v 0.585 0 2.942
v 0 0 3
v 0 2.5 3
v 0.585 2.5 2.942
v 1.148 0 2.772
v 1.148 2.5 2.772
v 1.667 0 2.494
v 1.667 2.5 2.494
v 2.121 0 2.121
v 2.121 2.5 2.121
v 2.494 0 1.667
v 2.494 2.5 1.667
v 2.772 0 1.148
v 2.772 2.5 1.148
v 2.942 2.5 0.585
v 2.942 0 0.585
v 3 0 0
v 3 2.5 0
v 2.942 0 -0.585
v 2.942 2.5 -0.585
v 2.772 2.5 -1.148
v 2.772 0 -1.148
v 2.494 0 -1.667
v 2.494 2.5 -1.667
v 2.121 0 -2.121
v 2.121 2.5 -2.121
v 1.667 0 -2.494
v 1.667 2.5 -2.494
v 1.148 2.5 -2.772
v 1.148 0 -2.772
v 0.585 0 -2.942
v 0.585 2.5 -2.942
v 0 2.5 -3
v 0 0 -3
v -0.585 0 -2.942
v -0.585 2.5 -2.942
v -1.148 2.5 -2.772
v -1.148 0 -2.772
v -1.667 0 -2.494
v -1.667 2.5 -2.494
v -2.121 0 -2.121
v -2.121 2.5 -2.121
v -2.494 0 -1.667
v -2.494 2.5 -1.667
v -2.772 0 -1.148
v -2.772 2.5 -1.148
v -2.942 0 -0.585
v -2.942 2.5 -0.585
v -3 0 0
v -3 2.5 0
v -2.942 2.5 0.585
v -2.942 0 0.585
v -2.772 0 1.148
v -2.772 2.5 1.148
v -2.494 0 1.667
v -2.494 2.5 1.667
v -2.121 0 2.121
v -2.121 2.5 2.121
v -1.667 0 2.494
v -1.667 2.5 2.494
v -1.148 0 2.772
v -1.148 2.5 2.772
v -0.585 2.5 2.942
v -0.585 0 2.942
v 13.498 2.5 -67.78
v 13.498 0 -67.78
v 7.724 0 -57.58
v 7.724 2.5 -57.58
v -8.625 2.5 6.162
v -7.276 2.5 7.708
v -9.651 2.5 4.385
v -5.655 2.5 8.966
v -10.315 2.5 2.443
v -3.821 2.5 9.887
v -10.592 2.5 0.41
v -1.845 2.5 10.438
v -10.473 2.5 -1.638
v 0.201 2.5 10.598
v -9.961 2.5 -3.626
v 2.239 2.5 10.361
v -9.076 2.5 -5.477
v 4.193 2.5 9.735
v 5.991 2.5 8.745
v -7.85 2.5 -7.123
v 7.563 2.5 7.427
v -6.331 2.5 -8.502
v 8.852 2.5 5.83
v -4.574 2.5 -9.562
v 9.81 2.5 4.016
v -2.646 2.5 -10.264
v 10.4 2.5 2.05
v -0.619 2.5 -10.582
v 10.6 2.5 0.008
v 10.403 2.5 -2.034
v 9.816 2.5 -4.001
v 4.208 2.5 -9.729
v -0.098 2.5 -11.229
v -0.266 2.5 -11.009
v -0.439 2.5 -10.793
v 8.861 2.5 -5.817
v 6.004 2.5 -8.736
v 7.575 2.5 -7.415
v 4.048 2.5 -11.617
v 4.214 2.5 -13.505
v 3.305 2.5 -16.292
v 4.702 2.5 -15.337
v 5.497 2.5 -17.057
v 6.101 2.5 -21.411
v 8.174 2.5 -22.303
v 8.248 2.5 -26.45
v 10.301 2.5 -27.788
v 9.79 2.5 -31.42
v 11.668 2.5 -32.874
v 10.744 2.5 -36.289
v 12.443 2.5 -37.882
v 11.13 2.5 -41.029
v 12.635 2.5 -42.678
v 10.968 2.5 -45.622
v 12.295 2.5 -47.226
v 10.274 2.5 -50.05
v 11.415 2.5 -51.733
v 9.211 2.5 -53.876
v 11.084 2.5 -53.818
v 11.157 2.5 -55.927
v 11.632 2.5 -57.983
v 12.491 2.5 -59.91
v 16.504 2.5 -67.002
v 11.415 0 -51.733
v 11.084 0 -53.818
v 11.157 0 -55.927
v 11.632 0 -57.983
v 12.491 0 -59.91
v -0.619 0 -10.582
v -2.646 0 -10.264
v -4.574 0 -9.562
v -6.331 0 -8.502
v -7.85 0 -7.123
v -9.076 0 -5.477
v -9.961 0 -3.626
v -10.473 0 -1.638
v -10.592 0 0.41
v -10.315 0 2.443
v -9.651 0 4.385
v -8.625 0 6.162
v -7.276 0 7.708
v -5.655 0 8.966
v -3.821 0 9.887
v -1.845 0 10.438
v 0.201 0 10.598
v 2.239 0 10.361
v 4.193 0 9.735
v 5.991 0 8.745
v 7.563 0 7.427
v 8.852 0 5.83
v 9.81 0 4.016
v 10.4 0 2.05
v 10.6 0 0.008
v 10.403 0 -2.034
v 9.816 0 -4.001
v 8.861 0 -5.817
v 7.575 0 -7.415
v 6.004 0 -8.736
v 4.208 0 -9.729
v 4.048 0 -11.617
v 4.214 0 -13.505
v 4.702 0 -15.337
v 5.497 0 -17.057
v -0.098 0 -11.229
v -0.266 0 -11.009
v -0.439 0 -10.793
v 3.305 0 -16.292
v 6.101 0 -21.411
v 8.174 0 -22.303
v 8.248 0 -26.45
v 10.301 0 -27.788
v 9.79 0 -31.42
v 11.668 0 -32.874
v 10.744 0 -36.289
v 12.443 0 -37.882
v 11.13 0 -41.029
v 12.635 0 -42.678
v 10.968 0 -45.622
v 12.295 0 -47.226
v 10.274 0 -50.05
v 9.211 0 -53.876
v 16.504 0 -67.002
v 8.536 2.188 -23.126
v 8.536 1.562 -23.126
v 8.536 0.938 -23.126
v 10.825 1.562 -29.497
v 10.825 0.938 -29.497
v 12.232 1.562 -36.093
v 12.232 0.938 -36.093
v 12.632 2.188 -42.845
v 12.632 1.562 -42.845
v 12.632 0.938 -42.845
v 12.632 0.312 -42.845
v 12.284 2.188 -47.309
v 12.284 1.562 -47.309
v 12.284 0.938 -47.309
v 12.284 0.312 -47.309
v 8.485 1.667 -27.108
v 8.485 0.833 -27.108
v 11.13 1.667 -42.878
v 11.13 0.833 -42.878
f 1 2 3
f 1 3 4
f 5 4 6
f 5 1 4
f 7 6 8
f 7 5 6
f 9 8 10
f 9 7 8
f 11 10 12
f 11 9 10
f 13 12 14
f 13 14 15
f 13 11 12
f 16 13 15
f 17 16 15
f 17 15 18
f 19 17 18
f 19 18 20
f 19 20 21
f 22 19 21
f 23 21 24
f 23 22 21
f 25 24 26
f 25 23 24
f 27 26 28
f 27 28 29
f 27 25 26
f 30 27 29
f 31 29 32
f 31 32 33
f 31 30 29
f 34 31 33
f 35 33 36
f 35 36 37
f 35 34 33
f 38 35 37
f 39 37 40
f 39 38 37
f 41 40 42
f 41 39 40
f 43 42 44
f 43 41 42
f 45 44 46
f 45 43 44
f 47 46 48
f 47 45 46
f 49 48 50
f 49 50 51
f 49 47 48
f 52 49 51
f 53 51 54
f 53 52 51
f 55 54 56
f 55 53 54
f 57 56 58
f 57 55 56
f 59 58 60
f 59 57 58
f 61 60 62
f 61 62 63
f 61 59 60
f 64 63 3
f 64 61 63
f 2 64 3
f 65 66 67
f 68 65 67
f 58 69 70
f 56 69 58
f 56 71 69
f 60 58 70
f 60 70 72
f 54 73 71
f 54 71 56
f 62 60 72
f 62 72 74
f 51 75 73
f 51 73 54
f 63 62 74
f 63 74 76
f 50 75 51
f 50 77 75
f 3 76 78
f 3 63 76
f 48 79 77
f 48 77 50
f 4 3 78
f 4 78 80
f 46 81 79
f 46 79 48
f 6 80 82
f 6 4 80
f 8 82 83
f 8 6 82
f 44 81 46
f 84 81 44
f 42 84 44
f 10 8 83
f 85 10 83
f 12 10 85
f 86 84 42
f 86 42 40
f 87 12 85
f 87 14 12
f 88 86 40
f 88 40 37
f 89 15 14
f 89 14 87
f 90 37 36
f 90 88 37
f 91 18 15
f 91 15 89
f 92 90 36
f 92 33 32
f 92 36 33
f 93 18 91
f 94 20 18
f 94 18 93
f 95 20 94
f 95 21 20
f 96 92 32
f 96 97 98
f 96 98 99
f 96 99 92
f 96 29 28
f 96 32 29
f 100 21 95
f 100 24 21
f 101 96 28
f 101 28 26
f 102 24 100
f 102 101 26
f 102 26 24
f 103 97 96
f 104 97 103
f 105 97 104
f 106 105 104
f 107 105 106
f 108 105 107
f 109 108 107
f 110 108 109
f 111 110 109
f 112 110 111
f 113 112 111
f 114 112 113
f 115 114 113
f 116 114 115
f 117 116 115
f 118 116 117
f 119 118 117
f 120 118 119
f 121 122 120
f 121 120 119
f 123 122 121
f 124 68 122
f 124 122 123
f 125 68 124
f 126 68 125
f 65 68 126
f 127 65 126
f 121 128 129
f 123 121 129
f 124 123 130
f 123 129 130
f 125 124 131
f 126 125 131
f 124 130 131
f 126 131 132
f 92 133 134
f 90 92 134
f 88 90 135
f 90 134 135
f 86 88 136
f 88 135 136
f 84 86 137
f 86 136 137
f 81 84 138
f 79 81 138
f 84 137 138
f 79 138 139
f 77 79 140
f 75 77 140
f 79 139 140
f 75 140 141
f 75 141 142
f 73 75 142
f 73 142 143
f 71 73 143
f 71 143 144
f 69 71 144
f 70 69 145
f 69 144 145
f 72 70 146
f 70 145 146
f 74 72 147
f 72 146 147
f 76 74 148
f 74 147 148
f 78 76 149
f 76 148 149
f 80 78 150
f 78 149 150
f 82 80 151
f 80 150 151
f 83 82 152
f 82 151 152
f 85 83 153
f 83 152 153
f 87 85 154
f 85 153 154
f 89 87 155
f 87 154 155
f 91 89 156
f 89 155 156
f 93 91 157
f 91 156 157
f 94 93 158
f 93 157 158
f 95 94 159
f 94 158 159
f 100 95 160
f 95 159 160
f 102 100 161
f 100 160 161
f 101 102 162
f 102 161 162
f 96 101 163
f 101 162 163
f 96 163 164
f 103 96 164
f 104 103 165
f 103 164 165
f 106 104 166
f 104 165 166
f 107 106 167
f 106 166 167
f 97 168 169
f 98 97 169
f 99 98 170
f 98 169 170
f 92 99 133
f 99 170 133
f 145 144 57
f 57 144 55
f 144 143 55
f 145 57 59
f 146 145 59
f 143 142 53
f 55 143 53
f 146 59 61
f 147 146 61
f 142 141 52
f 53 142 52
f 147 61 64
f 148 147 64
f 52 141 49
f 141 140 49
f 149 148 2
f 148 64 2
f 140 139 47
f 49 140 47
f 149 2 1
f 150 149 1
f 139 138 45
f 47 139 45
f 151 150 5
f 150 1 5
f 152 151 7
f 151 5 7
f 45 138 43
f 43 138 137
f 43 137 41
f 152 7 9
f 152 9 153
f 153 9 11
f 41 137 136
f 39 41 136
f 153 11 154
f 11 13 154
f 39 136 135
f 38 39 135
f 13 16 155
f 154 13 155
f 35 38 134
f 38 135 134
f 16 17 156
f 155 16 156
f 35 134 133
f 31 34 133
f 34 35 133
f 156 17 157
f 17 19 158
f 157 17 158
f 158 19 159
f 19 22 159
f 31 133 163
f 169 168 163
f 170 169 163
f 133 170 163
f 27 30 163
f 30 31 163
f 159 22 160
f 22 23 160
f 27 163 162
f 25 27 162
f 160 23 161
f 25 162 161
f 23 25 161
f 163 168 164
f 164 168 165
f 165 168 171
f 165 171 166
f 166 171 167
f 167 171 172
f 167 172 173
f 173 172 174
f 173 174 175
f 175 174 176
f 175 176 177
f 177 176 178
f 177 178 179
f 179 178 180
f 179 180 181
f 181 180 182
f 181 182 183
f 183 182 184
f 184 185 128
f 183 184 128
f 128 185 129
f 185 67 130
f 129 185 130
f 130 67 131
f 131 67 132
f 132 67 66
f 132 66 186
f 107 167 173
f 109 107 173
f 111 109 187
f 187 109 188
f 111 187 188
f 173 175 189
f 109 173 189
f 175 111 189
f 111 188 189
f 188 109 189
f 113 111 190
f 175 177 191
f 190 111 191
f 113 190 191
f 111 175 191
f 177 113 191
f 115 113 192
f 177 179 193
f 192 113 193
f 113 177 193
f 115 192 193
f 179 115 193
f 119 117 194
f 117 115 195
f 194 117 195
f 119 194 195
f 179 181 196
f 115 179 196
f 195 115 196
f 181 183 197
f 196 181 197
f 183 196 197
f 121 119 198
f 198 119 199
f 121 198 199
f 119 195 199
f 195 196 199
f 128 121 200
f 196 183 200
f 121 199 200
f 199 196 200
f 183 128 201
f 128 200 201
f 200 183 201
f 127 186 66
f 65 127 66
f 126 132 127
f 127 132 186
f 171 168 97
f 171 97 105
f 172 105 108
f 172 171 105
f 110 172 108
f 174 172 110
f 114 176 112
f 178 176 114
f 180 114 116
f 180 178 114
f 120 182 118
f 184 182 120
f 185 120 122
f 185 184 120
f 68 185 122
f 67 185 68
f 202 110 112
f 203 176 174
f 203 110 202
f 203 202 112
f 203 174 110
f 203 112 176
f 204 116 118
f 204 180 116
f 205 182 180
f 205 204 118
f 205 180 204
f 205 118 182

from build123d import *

# Parameters (mm, degrees)
SKETCH1_R           = 3
BOSS_EXTRUDE1_DEPTH = 2.5


with BuildPart() as part:
    # Sketch1 → Boss-Extrude1 (new body)
    with BuildSketch(Plane(origin=(0, 0, 0), x_dir=(1, 0, 0), z_dir=(0, 1, 0))):
        with BuildLine():
            Line((16.504384769, 67.001942846), (13.497620534, 67.780107201))
            Line((13.497620534, 67.780107201), (7.724071328, 57.579565356))
            add(Edge.make_bspline(
                [(-0.09847484, 11.22942621), (11.417322618, 26.843615689), (14.193248849, 43.730948361), (7.724071328, 57.579565356)],
                knots=[0.117374877, 0.117374877, 0.117374877, 0.117374877, 0.726153686, 0.726153686, 0.726153686, 0.726153686], degree=3))
            ThreePointArc((-0.09847484, 11.22942621), (-0.351961708, 10.90026492), (-0.618902028, 10.581916664))
            ThreePointArc((-0.618902028, 10.581916664), (-1.844722259, -10.438246969), (4.208359749, 9.728808161))
            ThreePointArc((4.208359749, 9.728808161), (4.214374117, 13.50532277), (5.497341127, 17.05723696))
            add(Edge.make_bspline(
                [(5.497341127, 17.05723696), (6.247224749, 18.369564751), (6.949389536, 19.705033958), (7.925084618, 21.74584693), (8.237367579, 22.432397455), (8.834853314, 23.818631134), (9.120431061, 24.519332655), (10.471450422, 28.041849379), (11.3095387, 30.920313304), (12.007053004, 34.605583669), (12.12890822, 35.347032839), (12.335497702, 36.839176051), (12.420373432, 37.591640588), (12.615035285, 39.850848786), (12.664547894, 41.35101651), (12.566324851, 45.833161956), (12.175786709, 48.797076432), (11.415069816, 51.733451528)],
                knots=[0, 0, 0, 0, 0.125, 0.125, 0.1875, 0.1875, 0.25, 0.25, 0.5, 0.5, 0.5625, 0.5625, 0.625, 0.625, 0.75, 0.75, 1, 1, 1, 1], degree=3))
            ThreePointArc((11.415069816, 51.733451528), (11.157464025, 55.926562312), (12.490570585, 59.910450575))
            Line((12.490570585, 59.910450575), (16.504384769, 67.001942846))
        make_face()
        with Locations(Location((0, 0, 0), (0, 0, 270))):
            Circle(SKETCH1_R, mode=Mode.SUBTRACT)
    extrude(amount=BOSS_EXTRUDE1_DEPTH)


solid = part.part
